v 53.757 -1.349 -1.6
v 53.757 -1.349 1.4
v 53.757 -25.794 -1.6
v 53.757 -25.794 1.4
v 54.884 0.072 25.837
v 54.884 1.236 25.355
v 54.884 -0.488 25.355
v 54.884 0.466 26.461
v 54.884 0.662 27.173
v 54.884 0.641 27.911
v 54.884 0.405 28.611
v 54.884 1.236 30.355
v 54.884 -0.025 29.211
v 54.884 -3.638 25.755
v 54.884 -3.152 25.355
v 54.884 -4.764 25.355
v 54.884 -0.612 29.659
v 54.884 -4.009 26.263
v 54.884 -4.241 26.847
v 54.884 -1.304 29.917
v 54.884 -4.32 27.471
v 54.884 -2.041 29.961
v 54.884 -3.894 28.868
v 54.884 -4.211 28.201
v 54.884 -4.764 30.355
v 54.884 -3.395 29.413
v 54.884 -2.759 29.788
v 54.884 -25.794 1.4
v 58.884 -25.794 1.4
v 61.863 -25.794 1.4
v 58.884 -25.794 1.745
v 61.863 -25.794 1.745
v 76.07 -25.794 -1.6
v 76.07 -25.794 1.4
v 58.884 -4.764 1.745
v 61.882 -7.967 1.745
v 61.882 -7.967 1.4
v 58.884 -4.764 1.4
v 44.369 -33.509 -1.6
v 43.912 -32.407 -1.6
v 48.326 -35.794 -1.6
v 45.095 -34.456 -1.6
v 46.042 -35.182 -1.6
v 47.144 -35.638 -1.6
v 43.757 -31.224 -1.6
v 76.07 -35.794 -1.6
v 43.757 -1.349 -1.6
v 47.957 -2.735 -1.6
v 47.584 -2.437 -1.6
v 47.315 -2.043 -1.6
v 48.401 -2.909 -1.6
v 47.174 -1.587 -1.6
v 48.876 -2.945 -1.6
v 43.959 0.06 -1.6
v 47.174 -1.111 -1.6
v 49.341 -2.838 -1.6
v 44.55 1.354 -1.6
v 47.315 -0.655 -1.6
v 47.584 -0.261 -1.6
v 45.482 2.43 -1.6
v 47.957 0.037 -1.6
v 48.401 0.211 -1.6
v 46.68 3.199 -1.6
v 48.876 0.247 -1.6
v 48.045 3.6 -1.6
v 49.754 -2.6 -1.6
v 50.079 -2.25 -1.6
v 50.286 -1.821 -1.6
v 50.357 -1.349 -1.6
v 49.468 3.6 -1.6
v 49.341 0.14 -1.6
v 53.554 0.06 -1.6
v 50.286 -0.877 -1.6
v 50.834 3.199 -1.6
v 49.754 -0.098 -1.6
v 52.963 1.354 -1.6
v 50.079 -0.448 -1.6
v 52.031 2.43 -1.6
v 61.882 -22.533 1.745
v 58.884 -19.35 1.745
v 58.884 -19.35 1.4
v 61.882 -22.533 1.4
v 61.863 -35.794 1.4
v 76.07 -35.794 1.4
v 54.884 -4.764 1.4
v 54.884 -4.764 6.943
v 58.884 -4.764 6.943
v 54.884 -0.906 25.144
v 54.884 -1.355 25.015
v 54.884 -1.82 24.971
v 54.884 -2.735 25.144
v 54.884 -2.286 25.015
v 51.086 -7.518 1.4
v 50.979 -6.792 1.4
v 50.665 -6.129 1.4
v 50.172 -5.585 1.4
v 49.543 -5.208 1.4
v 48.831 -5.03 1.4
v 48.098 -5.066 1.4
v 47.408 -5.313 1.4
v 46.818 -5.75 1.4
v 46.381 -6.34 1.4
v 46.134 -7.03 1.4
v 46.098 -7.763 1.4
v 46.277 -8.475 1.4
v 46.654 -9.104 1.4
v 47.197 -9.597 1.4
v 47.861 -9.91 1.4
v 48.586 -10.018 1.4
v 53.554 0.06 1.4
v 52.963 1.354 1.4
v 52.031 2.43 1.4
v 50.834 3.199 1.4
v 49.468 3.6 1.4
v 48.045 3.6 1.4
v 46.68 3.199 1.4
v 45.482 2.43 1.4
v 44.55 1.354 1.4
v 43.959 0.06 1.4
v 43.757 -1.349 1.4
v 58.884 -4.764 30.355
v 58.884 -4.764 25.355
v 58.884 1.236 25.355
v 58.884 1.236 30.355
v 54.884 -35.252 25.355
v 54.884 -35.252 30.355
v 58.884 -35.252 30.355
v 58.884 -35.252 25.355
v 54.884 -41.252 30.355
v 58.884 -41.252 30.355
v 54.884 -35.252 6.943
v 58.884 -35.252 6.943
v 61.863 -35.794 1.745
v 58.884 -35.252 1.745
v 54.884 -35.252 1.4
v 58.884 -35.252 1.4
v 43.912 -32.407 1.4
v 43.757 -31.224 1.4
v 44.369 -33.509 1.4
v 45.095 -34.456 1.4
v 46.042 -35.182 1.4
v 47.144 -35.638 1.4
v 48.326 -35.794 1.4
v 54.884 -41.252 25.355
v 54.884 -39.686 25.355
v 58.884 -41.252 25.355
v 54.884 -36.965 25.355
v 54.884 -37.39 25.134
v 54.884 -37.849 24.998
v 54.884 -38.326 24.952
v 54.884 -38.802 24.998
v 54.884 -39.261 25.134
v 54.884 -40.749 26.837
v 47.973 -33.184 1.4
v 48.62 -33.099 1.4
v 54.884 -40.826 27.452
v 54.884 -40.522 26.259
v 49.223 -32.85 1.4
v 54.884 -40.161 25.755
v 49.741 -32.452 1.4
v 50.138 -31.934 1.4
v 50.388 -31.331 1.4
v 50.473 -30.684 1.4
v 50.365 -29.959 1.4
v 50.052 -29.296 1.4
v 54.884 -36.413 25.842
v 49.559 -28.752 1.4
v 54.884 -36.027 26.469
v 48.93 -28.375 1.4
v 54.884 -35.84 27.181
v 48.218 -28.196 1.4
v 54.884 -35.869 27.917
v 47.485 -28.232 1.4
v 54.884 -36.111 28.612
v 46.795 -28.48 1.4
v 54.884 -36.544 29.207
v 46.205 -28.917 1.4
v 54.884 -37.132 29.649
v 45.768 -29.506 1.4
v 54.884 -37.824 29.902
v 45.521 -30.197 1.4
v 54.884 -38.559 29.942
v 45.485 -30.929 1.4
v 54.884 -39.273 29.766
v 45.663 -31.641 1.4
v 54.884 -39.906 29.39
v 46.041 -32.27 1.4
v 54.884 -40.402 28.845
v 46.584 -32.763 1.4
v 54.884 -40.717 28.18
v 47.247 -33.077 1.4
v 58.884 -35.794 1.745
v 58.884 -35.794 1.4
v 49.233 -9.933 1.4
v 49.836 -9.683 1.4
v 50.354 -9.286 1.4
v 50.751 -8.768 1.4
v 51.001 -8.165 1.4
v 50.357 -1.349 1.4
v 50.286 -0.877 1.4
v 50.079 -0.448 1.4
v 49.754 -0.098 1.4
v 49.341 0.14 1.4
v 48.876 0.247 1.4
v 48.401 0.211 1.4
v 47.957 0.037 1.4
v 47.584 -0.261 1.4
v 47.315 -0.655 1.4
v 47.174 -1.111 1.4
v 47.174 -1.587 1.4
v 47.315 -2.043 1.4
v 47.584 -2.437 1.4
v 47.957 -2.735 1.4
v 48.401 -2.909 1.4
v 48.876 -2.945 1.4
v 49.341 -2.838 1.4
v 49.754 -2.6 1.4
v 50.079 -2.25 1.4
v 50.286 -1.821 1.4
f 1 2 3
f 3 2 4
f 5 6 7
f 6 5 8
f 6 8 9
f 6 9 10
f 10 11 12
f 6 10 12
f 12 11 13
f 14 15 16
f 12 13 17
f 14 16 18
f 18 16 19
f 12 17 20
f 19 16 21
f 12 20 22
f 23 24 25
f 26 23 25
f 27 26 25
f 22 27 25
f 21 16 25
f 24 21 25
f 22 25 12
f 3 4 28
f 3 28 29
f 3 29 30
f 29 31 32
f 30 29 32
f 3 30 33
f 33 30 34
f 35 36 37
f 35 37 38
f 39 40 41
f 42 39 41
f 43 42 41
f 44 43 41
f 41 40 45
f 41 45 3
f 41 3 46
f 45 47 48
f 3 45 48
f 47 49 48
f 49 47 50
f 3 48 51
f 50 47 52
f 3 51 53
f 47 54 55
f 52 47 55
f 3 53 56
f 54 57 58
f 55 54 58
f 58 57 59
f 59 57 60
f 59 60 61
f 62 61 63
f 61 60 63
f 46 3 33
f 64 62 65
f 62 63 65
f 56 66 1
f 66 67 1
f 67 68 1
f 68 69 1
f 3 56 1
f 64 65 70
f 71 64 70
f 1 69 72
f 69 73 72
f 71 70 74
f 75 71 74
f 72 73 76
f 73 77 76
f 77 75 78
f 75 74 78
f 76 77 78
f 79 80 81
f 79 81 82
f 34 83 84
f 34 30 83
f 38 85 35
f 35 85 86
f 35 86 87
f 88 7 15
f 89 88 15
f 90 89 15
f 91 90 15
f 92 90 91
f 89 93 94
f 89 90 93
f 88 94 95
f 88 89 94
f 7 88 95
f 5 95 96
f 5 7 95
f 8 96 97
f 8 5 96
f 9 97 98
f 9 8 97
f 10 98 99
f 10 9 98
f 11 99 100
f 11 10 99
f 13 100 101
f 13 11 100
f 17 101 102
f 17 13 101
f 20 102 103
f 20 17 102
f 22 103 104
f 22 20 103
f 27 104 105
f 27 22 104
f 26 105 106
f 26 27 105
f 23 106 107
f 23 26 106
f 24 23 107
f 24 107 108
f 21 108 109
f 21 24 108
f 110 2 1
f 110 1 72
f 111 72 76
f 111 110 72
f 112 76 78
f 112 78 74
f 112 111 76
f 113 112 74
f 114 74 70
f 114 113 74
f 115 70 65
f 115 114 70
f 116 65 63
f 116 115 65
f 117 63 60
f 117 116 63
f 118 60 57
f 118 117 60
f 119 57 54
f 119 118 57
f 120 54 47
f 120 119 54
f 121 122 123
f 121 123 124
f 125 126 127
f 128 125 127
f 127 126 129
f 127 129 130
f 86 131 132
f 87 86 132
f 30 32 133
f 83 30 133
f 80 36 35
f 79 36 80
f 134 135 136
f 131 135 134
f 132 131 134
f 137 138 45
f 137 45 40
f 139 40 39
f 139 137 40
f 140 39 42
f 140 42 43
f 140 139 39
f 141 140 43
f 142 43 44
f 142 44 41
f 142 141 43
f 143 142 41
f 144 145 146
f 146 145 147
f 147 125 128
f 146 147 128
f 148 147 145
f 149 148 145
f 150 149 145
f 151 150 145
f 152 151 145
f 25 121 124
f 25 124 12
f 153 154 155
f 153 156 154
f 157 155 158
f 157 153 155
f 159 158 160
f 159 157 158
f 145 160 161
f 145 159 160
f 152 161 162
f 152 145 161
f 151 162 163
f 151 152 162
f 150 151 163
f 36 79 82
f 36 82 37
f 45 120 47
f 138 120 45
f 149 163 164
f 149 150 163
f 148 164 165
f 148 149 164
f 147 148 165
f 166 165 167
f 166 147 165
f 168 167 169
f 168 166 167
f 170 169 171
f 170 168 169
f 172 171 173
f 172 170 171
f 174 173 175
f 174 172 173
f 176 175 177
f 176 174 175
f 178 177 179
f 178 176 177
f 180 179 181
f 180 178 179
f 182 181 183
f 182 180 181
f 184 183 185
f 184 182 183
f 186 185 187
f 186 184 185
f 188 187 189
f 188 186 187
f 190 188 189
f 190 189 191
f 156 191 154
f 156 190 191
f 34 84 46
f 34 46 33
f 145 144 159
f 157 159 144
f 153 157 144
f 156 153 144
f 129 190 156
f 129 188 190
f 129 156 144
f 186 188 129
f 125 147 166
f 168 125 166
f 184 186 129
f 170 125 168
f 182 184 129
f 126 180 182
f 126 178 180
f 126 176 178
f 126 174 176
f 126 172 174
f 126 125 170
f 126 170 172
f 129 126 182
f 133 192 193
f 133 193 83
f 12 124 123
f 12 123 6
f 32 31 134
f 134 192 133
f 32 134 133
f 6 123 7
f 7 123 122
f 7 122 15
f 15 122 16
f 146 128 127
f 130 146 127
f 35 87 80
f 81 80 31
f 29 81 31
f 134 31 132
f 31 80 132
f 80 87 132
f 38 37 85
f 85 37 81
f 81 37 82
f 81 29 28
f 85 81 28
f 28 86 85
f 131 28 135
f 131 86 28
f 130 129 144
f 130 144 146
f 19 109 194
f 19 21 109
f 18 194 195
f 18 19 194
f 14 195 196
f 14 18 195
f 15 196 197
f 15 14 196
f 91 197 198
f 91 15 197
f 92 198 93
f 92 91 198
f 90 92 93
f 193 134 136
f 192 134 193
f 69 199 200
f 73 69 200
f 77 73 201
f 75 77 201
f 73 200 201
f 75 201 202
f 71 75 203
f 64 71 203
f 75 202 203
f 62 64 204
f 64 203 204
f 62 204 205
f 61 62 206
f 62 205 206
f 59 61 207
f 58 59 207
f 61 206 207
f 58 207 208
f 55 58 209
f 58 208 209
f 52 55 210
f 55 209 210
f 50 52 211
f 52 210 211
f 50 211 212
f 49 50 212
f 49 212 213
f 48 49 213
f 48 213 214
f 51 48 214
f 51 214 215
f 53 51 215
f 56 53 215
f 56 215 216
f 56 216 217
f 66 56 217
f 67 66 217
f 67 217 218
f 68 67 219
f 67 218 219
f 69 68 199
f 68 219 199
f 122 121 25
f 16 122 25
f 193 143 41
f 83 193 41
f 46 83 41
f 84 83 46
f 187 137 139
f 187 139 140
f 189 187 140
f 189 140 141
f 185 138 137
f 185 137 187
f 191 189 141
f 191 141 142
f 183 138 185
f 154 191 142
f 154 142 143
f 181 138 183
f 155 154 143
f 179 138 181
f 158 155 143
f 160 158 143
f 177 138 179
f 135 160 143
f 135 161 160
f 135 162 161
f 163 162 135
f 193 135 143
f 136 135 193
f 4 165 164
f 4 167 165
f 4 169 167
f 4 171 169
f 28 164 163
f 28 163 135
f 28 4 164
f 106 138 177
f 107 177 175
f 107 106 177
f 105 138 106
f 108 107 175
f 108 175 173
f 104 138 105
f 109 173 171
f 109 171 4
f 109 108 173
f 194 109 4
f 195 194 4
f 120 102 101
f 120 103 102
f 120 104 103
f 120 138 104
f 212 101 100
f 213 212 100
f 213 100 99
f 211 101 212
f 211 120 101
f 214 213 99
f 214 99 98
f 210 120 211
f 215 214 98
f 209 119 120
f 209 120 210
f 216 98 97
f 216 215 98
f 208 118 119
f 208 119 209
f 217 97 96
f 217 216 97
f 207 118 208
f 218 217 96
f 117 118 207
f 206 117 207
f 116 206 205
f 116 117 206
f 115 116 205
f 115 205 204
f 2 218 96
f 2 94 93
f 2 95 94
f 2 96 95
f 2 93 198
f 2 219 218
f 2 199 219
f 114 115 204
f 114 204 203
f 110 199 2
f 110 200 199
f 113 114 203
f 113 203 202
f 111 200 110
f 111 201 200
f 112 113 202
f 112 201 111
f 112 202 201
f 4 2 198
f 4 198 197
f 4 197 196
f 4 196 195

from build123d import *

# Parameters (mm, degrees)
SKETCH_W     = 4
SKETCH_H     = 30.488262
PAD_DEPTH    = 5.542531
SKETCH077_R  = 1.6
PAD048_DEPTH = 3
SKETCH078_W  = 4
SKETCH078_H  = 5
PAD049_DEPTH = 6
SKETCH079_W  = 4
SKETCH079_H  = 5
PAD050_DEPTH = 6
SKETCH081_R  = 2.5
SKETCH080_R  = 2.5
SKETCH083_R  = 2.5
SKETCH082_R  = 2.5
SKETCH089_W  = 2.978887
SKETCH089_H  = 9.99982
PAD052_DEPTH = 0.345274
PAD053_DEPTH = 0.345274


with BuildPart() as part:
    # Sketch (on Face1 of Binder) → Pad (new body)
    with BuildSketch(Plane(origin=(0, 0, 6.942531), x_dir=(1, 0, 0), z_dir=(0, 0, -1))):
        with Locations((56.883999, 20.008358)):
            Rectangle(SKETCH_W, SKETCH_H)
    extrude(amount=PAD_DEPTH)

    # Sketch077 (on Face1 of Binder012) → Pad048 (join)
    with BuildSketch(Plane.XY.offset(1.4)):
        with BuildLine():
            ThreePointArc((53.756622, -1.348999), (48.756621, 3.651001), (43.756622, -1.349001))
            Line((43.756622, -1.349001), (43.756632, -31.224267))
            ThreePointArc((43.756632, -31.224267), (45.095095, -34.455628), (48.32644, -35.794131))
            Line((48.32644, -35.794131), (76.070248, -35.794482))
            Line((76.070248, -35.794482), (76.070248, -25.794482))
            Line((53.756622, -25.794482), (76.070248, -25.794482))
            Line((53.756622, -1.348999), (53.756622, -25.794482))
        make_face()
        with Locations((48.756622, -1.348999)):
            Circle(SKETCH077_R, mode=Mode.SUBTRACT)
    extrude(amount=-PAD048_DEPTH)

    # Sketch078 (on Face1 of Binder013) → Pad049 (join)
    with BuildSketch(Plane.XZ.offset(35.252489)):
        with Locations((56.883999, 27.855274)):
            Rectangle(SKETCH078_W, SKETCH078_H)
    extrude(amount=PAD049_DEPTH)

    # Sketch079 (on Face2 of Binder013) → Pad050 (join)
    with BuildSketch(Plane(origin=(0, -4.764227, 0), x_dir=(-1, 0, 0), z_dir=(0, 1, 0))):
        with Locations((-56.883999, 27.855274)):
            Rectangle(SKETCH079_W, SKETCH079_H)
    extrude(amount=PAD050_DEPTH)

    # Sketch081 (on Face5 of Pad050) → AdditiveLoft section 0
    with BuildSketch(Plane.XY.offset(1.4)):
        with Locations((47.973045, -30.684446)):
            Circle(SKETCH081_R)
    # Sketch080 (on Face17 of Pad050) → AdditiveLoft section 1
    with BuildSketch(Plane(origin=(54.883999, 0, 0), x_dir=(0, -1, 0), z_dir=(-1, 0, 0))):
        with Locations((38.325539, 27.452477)):
            Circle(SKETCH080_R)
    loft()

    # Sketch083 (on Face5 of AdditiveLoft) → AdditiveLoft009 section 0
    with BuildSketch(Plane.XY.offset(1.4)):
        with Locations((48.586216, -7.518005)):
            Circle(SKETCH083_R)
    # Sketch082 (on Face28 of AdditiveLoft) → AdditiveLoft009 section 1
    with BuildSketch(Plane(origin=(54.883999, 0, 0), x_dir=(0, -1, 0), z_dir=(-1, 0, 0))):
        with Locations((1.820387, 27.470873)):
            Circle(SKETCH082_R)
    loft()

    # Sketch089 (on Face1 of Binder019) → Pad052 (join)
    with BuildSketch(Plane(origin=(0, 0, 1.745274), x_dir=(1, 0, 0), z_dir=(0, 0, -1))):
        with Locations((60.373442, 30.794392)):
            Rectangle(SKETCH089_W, SKETCH089_H)
    extrude(amount=PAD052_DEPTH)

    # Sketch090 (on Face1 of Binder019) → Pad053 (join)
    with BuildSketch(Plane(origin=(0, 0, 1.745274), x_dir=(1, 0, 0), z_dir=(0, 0, -1))):
        Polygon((58.883999, 4.764227), (58.883999, 19.349763), (61.881626, 22.532681), (61.881626, 7.966667), align=None)
    extrude(amount=PAD053_DEPTH)


solid = part.part
